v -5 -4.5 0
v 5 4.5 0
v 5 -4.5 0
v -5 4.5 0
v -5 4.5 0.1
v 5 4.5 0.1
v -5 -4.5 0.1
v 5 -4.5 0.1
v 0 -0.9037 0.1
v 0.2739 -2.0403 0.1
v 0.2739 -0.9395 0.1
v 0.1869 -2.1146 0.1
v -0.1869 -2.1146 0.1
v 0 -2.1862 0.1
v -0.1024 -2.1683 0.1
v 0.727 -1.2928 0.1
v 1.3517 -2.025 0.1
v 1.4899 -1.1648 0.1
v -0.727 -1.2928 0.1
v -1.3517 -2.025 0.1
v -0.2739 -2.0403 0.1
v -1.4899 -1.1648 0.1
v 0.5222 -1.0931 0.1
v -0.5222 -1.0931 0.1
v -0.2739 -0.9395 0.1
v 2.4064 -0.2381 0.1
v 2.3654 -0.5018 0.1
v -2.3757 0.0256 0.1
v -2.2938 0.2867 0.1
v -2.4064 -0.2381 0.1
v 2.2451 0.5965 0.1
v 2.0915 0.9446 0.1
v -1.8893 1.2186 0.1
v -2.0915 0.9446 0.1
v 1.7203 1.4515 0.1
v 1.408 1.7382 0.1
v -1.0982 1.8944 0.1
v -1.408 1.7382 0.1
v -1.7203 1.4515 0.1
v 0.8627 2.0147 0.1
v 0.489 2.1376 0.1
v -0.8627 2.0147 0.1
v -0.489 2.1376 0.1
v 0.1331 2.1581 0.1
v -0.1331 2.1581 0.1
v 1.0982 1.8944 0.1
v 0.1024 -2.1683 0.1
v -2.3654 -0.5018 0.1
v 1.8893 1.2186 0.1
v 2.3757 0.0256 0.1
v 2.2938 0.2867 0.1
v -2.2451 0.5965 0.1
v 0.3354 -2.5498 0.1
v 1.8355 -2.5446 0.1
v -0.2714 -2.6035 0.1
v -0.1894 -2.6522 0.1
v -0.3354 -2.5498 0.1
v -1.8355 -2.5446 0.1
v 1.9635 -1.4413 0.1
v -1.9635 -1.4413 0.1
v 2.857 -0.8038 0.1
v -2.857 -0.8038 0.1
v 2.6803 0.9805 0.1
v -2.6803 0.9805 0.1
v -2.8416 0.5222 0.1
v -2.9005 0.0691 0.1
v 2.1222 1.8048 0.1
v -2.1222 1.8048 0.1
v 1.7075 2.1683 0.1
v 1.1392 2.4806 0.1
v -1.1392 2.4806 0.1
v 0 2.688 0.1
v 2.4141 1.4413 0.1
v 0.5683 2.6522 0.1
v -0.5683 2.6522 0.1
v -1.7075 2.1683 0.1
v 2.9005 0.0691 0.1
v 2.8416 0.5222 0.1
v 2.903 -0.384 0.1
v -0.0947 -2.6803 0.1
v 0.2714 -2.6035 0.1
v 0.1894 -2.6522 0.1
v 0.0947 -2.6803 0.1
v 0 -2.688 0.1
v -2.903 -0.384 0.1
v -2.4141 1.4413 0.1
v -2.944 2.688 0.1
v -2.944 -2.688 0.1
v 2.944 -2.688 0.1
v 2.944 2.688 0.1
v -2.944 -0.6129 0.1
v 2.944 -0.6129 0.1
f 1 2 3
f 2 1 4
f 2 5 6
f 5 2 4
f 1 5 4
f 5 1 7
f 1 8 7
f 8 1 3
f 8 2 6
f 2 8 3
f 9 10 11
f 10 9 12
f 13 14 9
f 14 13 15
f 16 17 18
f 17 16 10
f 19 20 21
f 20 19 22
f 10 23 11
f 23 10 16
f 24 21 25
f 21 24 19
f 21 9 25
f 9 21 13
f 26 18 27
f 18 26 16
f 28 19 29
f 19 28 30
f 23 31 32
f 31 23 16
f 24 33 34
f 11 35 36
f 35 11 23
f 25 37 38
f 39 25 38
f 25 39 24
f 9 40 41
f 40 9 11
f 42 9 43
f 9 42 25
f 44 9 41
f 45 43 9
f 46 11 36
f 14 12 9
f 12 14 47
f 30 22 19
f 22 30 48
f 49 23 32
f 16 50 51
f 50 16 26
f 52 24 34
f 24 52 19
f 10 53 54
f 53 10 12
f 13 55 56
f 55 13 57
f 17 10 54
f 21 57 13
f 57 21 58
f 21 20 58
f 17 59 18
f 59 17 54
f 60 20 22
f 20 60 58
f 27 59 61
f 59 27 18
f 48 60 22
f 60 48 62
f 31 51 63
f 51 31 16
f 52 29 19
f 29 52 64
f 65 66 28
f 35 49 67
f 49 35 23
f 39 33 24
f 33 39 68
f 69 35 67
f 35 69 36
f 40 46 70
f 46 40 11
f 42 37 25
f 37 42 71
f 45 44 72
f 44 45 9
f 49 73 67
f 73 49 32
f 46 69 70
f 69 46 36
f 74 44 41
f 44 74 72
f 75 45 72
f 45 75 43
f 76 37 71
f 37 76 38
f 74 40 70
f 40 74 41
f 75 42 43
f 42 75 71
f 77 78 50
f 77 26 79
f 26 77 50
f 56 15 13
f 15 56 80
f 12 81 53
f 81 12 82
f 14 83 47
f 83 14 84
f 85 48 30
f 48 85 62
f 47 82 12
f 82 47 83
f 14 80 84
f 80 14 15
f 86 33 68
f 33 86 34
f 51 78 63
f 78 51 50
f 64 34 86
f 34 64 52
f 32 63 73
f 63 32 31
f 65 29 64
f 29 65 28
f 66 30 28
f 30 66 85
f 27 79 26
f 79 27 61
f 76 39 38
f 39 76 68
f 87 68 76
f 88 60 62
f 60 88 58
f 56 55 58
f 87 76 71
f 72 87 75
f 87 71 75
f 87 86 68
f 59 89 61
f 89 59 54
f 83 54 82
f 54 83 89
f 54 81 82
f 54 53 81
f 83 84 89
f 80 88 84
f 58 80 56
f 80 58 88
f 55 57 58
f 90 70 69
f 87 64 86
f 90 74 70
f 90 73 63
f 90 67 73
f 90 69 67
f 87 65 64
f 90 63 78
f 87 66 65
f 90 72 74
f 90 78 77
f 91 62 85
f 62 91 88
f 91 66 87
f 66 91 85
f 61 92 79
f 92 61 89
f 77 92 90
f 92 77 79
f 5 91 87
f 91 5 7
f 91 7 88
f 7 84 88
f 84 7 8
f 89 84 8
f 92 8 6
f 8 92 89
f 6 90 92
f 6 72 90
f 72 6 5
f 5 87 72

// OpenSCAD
// file: ../p/logo-shell-1971-outerbox.scad
use <../lib.scad>
function ldraw_lib__logo_shell_1971_outerbox() = [
// 0 Logo Shell 1971 Outerbox
// 0 Name: logo-shell-1971-outerbox.dat
// 0 Author: Vincent Messenet [Cheenzo]
// 0 !LDRAW_ORG Primitive UPDATE 2023-04
// 0 !LICENSE Licensed under CC BY 4.0 : see CAreadme.txt
// 
// 0 BFC CERTIFY CCW
  [0,"BFC","CERTIFY"],
  [0,"BFC","CCW"],
// 
// 0 !HISTORY 2023-06-28 [Cheenzo] Created based on 3004s60 by J. C. Tchang [tchang]
// 0 !HISTORY 2023-08-25 [OrionP] Official Update 2023-04
// 
// 
// 0 // Shell Logo 1971
// 0 // Size: x = -11.5 to 11.5 y = -10.5 to 10.5 z = 0
// 
// 3 16 -11.5 0 10.5 -8.29 0 7.05 -6.67 0 8.47
  [3,16,-11.5,0,10.5,-8.29,0,7.05,-6.67,0,8.47],
// 4 16 -7.17 0 -9.94 -7.67 0 -5.63 -11.16 0 -3.14 -11.5 0 -10.5
  [4,16,-7.17,0,-9.94,-7.67,0,-5.63,-11.16,0,-3.14,-11.5,0,-10.5],
// 3 16 -.74 0 -10.36 -1.06 0 -10.17 -7.17 0 -9.94
  [3,16,-.74,0,-10.36,-1.06,0,-10.17,-7.17,0,-9.94],
// 3 16 -11.5 0 10.5 -6.67 0 8.47 -4.45 0 9.69
  [3,16,-11.5,0,10.5,-6.67,0,8.47,-4.45,0,9.69],
// 3 16 0 0 10.5 -11.5 0 10.5 -2.22 0 10.36
  [3,16,0,0,10.5,-11.5,0,10.5,-2.22,0,10.36],
// 3 16 -11.5 0 10.5 -4.45 0 9.69 -2.22 0 10.36
  [3,16,-11.5,0,10.5,-4.45,0,9.69,-2.22,0,10.36],
// 3 16 -11.5 0 10.5 -9.43 0 5.63 -8.29 0 7.05
  [3,16,-11.5,0,10.5,-9.43,0,5.63,-8.29,0,7.05],
// 4 16 11.16 0 -3.14 7.67 0 -5.63 7.17 0 -9.94 11.5 0 -10.5
  [4,16,11.16,0,-3.14,7.67,0,-5.63,7.17,0,-9.94,11.5,0,-10.5],
// 4 16 11.5 0 -10.5 7.17 0 -9.94 .74 0 -10.36 .37 0 -10.47
  [4,16,11.5,0,-10.5,7.17,0,-9.94,.74,0,-10.36,.37,0,-10.47],
// 3 16 7.17 0 -9.94 1.06 0 -10.17 .74 0 -10.36
  [3,16,7.17,0,-9.94,1.06,0,-10.17,.74,0,-10.36],
// 3 16 7.17 0 -9.94 1.31 0 -9.96 1.06 0 -10.17
  [3,16,7.17,0,-9.94,1.31,0,-9.96,1.06,0,-10.17],
// 3 16 .37 0 -10.47 0 0 -10.5 11.5 0 -10.5
  [3,16,.37,0,-10.47,0,0,-10.5,11.5,0,-10.5],
// 3 16 -.37 0 -10.47 -11.5 0 -10.5 0 0 -10.5
  [3,16,-.37,0,-10.47,-11.5,0,-10.5,0,0,-10.5],
// 4 16 -.37 0 -10.47 -.74 0 -10.36 -7.17 0 -9.94 -11.5 0 -10.5
  [4,16,-.37,0,-10.47,-.74,0,-10.36,-7.17,0,-9.94,-11.5,0,-10.5],
// 3 16 -1.06 0 -10.17 -1.31 0 -9.96 -7.17 0 -9.94
  [3,16,-1.06,0,-10.17,-1.31,0,-9.96,-7.17,0,-9.94],
// 3 16 11.5 0 10.5 4.45 0 9.69 6.67 0 8.47
  [3,16,11.5,0,10.5,4.45,0,9.69,6.67,0,8.47],
// 3 16 -11.5 0 10.5 -10.47 0 3.83 -9.43 0 5.63
  [3,16,-11.5,0,10.5,-10.47,0,3.83,-9.43,0,5.63],
// 3 16 11.5 0 10.5 2.22 0 10.36 4.45 0 9.69
  [3,16,11.5,0,10.5,2.22,0,10.36,4.45,0,9.69],
// 3 16 11.5 0 10.5 9.43 0 5.63 10.47 0 3.83
  [3,16,11.5,0,10.5,9.43,0,5.63,10.47,0,3.83],
// 3 16 11.5 0 10.5 8.29 0 7.05 9.43 0 5.63
  [3,16,11.5,0,10.5,8.29,0,7.05,9.43,0,5.63],
// 3 16 11.5 0 10.5 6.67 0 8.47 8.29 0 7.05
  [3,16,11.5,0,10.5,6.67,0,8.47,8.29,0,7.05],
// 3 16 -11.5 0 10.5 -11.1 0 2.04 -10.47 0 3.83
  [3,16,-11.5,0,10.5,-11.1,0,2.04,-10.47,0,3.83],
// 3 16 11.5 0 10.5 10.47 0 3.83 11.1 0 2.04
  [3,16,11.5,0,10.5,10.47,0,3.83,11.1,0,2.04],
// 3 16 -11.5 0 10.5 -11.33 0 .27 -11.1 0 2.04
  [3,16,-11.5,0,10.5,-11.33,0,.27,-11.1,0,2.04],
// 3 16 11.5 0 10.5 0 0 10.5 2.22 0 10.36
  [3,16,11.5,0,10.5,0,0,10.5,2.22,0,10.36],
// 3 16 11.5 0 10.5 11.1 0 2.04 11.33 0 .27
  [3,16,11.5,0,10.5,11.1,0,2.04,11.33,0,.27],
// 4 16 -11.16 0 -3.14 -11.34 0 -1.5 -11.5 0 -2.39 -11.5 0 -10.5
  [4,16,-11.16,0,-3.14,-11.34,0,-1.5,-11.5,0,-2.39,-11.5,0,-10.5],
// 4 16 -11.34 0 -1.5 -11.33 0 .27 -11.5 0 10.5 -11.5 0 -2.39
  [4,16,-11.34,0,-1.5,-11.33,0,.27,-11.5,0,10.5,-11.5,0,-2.39],
// 4 16 11.5 0 -2.39 11.34 0 -1.5 11.16 0 -3.14 11.5 0 -10.5
  [4,16,11.5,0,-2.39,11.34,0,-1.5,11.16,0,-3.14,11.5,0,-10.5],
// 4 16 11.5 0 -2.39 11.5 0 10.5 11.33 0 .27 11.34 0 -1.5
  [4,16,11.5,0,-2.39,11.5,0,10.5,11.33,0,.27,11.34,0,-1.5],
];
module ldraw_lib__logo_shell_1971_outerbox(step=0, col=false, unit=2/5, alt=false, line=0.2, solid=!$preview)
    makepoly(ldraw_lib__logo_shell_1971_outerbox(), step=step, col=col, unit=unit, alt=alt, line=line, solid=solid);
ldraw_lib__logo_shell_1971_outerbox(line=0.2);
// file: ../p/box5-12.scad
use <../lib.scad>
function ldraw_lib__box5_12() = [
// 0 Box with 5 Faces without Any Edges
// 0 Name: box5-12.dat
// 0 Author: Chris Dee [cwdee]
// 0 !LDRAW_ORG Primitive UPDATE 2009-02
// 0 !LICENSE Licensed under CC BY 4.0 : see CAreadme.txt
// 
// 0 BFC CERTIFY CCW
  [0,"BFC","CERTIFY"],
  [0,"BFC","CCW"],
// 
// 0 !HISTORY 2009-09-03 [PTadmin] Official Update 2009-02
// 
// 
// 4 16 1 1 1 1 1 -1 -1 1 -1 -1 1 1
  [4,16,1,1,1,1,1,-1,-1,1,-1,-1,1,1],
// 4 16 -1 0 1 1 0 1 1 1 1 -1 1 1
  [4,16,-1,0,1,1,0,1,1,1,1,-1,1,1],
// 4 16 -1 0 -1 -1 0 1 -1 1 1 -1 1 -1
  [4,16,-1,0,-1,-1,0,1,-1,1,1,-1,1,-1],
// 4 16 1 0 -1 -1 0 -1 -1 1 -1 1 1 -1
  [4,16,1,0,-1,-1,0,-1,-1,1,-1,1,1,-1],
// 4 16 1 0 1 1 0 -1 1 1 -1 1 1 1
  [4,16,1,0,1,1,0,-1,1,1,-1,1,1,1],
// 0
];
module ldraw_lib__box5_12(step=0, col=false, unit=2/5, alt=false, line=0.2, solid=!$preview)
    makepoly(ldraw_lib__box5_12(), step=step, col=col, unit=unit, alt=alt, line=line, solid=solid);
ldraw_lib__box5_12(line=0.2);
// file: 004318b.scad
use <../lib.scad>
use <../p/box5-12.scad>
use <../p/logo-shell-1971-outerbox.scad>
use <../p/logo-shell-1971.scad>
function ldraw_lib__004318b() = [
// 0 Sticker  1.1 x  1.25 with Shell Logo 1971
// 0 Name: 004318b.dat
// 0 Author: Alex Taylor [anathema]
// 0 !LDRAW_ORG Part UPDATE 2023-04
// 0 !LICENSE Licensed under CC BY 4.0 : see CAreadme.txt
// 
// 0 BFC CERTIFY CCW
  [0,"BFC","CERTIFY"],
  [0,"BFC","CCW"],
// 
// 0 !KEYWORDS Bricklink 604.1stk01, Brickowl 297283, Rebrickable 4318stk, set 604
// 
// 0 !HISTORY 2019-12-27 [PTadmin] Official Update 2019-03
// 0 !HISTORY 2023-06-30 [Cheenzo] Made use of logo prims, removed and added keyword
// 0 !HISTORY 2023-08-25 [OrionP] Official Update 2023-04
// 
// 
// 1 16 0 -0.25 0 12.5 0 0 0 0.25 0 0 0 11.25 box5-12.dat
  [1,16,0,-0.25,0,12.5,0,0,0,0.25,0,0,0,11.25, ldraw_lib__box5_12()],
// 1 16 0 -.25 0 .64 0 0 0 1 0 0 0 .64 logo-shell-1971.dat
  [1,16,0,-.25,0,.64,0,0,0,1,0,0,0,.64, ldraw_lib__logo_shell_1971()],
// 1 15 0 -.25 0 .64 0 0 0 1 0 0 0 .64 logo-shell-1971-outerbox.dat
  [1,15,0,-.25,0,.64,0,0,0,1,0,0,0,.64, ldraw_lib__logo_shell_1971_outerbox()],
// 4 15 -7.36 -.25 -1.5296 -7.36 -.25 6.72 -12.5 -.25 11.25 -12.5 -.25 -11.25
  [4,15,-7.36,-.25,-1.5296,-7.36,-.25,6.72,-12.5,-.25,11.25,-12.5,-.25,-11.25],
// 3 15 -7.36 -.25 -1.5296 -12.5 -.25 -11.25 -7.36 -.25 -6.72
  [3,15,-7.36,-.25,-1.5296,-12.5,-.25,-11.25,-7.36,-.25,-6.72],
// 4 15 0 -0.25 -6.72 -7.36 -0.25 -6.72 -12.5 -0.25 -11.25 12.5 -0.25 -11.25
  [4,15,0,-0.25,-6.72,-7.36,-0.25,-6.72,-12.5,-0.25,-11.25,12.5,-0.25,-11.25],
// 3 15 7.36 -0.25 -6.72 0 -0.25 -6.72 12.5 -0.25 -11.25
  [3,15,7.36,-0.25,-6.72,0,-0.25,-6.72,12.5,-0.25,-11.25],
// 4 15 7.36 -.25 -1.5296 7.36 -.25 -6.72 12.5 -.25 -11.25 12.5 -.25 11.25
  [4,15,7.36,-.25,-1.5296,7.36,-.25,-6.72,12.5,-.25,-11.25,12.5,-.25,11.25],
// 3 15 12.5 -.25 11.25 7.36 -.25 6.72 7.36 -.25 -1.5296
  [3,15,12.5,-.25,11.25,7.36,-.25,6.72,7.36,-.25,-1.5296],
// 4 15 0 -0.25 6.72 7.36 -0.25 6.72 12.5 -0.25 11.25 -12.5 -0.25 11.25
  [4,15,0,-0.25,6.72,7.36,-0.25,6.72,12.5,-0.25,11.25,-12.5,-0.25,11.25],
// 3 15 -12.5 -0.25 11.25 -7.36 -0.25 6.72 0 -0.25 6.72
  [3,15,-12.5,-0.25,11.25,-7.36,-0.25,6.72,0,-0.25,6.72],
];
module ldraw_lib__004318b(step=0, col=false, unit=2/5, alt=false, line=0.2, solid=!$preview)
    makepoly(ldraw_lib__004318b(), step=step, col=col, unit=unit, alt=alt, line=line, solid=solid);
ldraw_lib__004318b(line=0.2);
// main file
use <../lib.scad>
use <004318b.scad>
function ldraw_lib__004401a() = [
// 0 =Sticker  1.1 x  1.25 with Shell Logo 1971
// 0 Name: 004401a.dat
// 0 Author: Takeshi Takahashi [RainbowDolphin]
// 0 !LDRAW_ORG Part Alias UPDATE 2024-07
// 0 !LICENSE Licensed under CC BY 4.0 : see CAreadme.txt
// 
// 0 BFC CERTIFY CCW
  [0,"BFC","CERTIFY"],
  [0,"BFC","CCW"],
// 
// 0 !KEYWORDS Set 642, Tow Truck
// 
// 0 !HISTORY 2024-08-26 [OrionP] Official Update 2024-07
// 
// 1 16 0 0 0 1 0 0 0 1 0 0 0 1 004318b.dat
  [1,16,0,0,0,1,0,0,0,1,0,0,0,1, ldraw_lib__004318b()],
];
module ldraw_lib__004401a(step=0, col=false, unit=2/5, alt=false, line=0.2, solid=!$preview)
    makepoly(ldraw_lib__004401a(), step=step, col=col, unit=unit, alt=alt, line=line, solid=solid);
ldraw_lib__004401a(line=0.2);
